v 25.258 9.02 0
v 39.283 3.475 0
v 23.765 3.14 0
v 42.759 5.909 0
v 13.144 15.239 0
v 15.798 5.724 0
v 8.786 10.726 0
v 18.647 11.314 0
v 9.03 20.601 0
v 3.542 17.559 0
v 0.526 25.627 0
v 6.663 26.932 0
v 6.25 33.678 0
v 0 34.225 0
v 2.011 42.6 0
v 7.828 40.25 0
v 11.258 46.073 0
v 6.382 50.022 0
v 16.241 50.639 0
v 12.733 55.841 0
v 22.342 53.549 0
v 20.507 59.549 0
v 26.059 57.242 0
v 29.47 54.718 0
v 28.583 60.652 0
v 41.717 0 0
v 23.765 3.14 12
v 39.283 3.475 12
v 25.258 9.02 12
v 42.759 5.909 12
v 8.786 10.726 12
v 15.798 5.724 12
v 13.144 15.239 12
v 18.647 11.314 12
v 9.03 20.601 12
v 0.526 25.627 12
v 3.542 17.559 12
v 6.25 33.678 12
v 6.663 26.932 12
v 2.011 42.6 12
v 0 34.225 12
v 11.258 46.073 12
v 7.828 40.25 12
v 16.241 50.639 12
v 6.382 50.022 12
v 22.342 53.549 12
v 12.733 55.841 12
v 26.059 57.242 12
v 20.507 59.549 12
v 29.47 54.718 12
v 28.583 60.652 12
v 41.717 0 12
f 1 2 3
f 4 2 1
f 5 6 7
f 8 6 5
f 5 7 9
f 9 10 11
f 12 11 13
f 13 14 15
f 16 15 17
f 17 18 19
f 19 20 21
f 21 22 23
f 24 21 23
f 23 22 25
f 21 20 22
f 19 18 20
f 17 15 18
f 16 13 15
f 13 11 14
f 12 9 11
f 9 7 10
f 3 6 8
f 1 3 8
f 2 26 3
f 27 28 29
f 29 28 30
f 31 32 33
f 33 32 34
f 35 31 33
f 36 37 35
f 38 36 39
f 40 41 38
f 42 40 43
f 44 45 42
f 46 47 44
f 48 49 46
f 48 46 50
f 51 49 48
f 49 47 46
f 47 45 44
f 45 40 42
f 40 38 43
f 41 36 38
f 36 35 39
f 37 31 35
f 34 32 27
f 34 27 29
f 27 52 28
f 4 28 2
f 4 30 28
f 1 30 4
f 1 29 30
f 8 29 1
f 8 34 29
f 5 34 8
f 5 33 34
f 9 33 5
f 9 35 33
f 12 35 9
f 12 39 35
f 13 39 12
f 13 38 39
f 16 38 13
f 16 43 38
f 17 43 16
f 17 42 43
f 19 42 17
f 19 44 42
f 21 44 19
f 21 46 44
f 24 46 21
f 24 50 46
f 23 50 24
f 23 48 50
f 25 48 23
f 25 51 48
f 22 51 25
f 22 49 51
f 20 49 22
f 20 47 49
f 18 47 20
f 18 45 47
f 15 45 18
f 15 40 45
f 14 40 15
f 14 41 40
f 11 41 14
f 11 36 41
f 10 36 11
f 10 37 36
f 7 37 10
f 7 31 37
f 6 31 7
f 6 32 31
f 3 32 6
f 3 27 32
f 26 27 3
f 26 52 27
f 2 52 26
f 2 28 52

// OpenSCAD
$fn = 32;

// ----------------------------------------------------------------------
// Hook plate: curl radius 26 mm over 170 degrees, 6 mm thick band
// ----------------------------------------------------------------------

// --- parameters (mm) ---
profile_height = 12;      // extrusion height
profile_points = 26;      // points of the closed outline

profile = [[26.059, 57.242], [28.583, 60.652], [20.507, 59.549], [12.733, 55.841], [6.382, 50.022], [2.011, 42.6], [0, 34.225], [0.526, 25.627], [3.542, 17.559], [8.786, 10.726], [15.798, 5.724], [23.765, 3.14], [41.717, 0], [39.283, 3.475], [42.759, 5.909], [25.258, 9.02], [18.647, 11.314], [13.144, 15.239], [9.03, 20.601], [6.663, 26.932], [6.25, 33.678], [7.828, 40.25], [11.258, 46.073], [16.241, 50.639], [22.342, 53.549], [29.47, 54.718]];  // single closed polygon, 26 points, counter clockwise

// --- the one profile operation ---
linear_extrude(height = profile_height) polygon(points = profile);
